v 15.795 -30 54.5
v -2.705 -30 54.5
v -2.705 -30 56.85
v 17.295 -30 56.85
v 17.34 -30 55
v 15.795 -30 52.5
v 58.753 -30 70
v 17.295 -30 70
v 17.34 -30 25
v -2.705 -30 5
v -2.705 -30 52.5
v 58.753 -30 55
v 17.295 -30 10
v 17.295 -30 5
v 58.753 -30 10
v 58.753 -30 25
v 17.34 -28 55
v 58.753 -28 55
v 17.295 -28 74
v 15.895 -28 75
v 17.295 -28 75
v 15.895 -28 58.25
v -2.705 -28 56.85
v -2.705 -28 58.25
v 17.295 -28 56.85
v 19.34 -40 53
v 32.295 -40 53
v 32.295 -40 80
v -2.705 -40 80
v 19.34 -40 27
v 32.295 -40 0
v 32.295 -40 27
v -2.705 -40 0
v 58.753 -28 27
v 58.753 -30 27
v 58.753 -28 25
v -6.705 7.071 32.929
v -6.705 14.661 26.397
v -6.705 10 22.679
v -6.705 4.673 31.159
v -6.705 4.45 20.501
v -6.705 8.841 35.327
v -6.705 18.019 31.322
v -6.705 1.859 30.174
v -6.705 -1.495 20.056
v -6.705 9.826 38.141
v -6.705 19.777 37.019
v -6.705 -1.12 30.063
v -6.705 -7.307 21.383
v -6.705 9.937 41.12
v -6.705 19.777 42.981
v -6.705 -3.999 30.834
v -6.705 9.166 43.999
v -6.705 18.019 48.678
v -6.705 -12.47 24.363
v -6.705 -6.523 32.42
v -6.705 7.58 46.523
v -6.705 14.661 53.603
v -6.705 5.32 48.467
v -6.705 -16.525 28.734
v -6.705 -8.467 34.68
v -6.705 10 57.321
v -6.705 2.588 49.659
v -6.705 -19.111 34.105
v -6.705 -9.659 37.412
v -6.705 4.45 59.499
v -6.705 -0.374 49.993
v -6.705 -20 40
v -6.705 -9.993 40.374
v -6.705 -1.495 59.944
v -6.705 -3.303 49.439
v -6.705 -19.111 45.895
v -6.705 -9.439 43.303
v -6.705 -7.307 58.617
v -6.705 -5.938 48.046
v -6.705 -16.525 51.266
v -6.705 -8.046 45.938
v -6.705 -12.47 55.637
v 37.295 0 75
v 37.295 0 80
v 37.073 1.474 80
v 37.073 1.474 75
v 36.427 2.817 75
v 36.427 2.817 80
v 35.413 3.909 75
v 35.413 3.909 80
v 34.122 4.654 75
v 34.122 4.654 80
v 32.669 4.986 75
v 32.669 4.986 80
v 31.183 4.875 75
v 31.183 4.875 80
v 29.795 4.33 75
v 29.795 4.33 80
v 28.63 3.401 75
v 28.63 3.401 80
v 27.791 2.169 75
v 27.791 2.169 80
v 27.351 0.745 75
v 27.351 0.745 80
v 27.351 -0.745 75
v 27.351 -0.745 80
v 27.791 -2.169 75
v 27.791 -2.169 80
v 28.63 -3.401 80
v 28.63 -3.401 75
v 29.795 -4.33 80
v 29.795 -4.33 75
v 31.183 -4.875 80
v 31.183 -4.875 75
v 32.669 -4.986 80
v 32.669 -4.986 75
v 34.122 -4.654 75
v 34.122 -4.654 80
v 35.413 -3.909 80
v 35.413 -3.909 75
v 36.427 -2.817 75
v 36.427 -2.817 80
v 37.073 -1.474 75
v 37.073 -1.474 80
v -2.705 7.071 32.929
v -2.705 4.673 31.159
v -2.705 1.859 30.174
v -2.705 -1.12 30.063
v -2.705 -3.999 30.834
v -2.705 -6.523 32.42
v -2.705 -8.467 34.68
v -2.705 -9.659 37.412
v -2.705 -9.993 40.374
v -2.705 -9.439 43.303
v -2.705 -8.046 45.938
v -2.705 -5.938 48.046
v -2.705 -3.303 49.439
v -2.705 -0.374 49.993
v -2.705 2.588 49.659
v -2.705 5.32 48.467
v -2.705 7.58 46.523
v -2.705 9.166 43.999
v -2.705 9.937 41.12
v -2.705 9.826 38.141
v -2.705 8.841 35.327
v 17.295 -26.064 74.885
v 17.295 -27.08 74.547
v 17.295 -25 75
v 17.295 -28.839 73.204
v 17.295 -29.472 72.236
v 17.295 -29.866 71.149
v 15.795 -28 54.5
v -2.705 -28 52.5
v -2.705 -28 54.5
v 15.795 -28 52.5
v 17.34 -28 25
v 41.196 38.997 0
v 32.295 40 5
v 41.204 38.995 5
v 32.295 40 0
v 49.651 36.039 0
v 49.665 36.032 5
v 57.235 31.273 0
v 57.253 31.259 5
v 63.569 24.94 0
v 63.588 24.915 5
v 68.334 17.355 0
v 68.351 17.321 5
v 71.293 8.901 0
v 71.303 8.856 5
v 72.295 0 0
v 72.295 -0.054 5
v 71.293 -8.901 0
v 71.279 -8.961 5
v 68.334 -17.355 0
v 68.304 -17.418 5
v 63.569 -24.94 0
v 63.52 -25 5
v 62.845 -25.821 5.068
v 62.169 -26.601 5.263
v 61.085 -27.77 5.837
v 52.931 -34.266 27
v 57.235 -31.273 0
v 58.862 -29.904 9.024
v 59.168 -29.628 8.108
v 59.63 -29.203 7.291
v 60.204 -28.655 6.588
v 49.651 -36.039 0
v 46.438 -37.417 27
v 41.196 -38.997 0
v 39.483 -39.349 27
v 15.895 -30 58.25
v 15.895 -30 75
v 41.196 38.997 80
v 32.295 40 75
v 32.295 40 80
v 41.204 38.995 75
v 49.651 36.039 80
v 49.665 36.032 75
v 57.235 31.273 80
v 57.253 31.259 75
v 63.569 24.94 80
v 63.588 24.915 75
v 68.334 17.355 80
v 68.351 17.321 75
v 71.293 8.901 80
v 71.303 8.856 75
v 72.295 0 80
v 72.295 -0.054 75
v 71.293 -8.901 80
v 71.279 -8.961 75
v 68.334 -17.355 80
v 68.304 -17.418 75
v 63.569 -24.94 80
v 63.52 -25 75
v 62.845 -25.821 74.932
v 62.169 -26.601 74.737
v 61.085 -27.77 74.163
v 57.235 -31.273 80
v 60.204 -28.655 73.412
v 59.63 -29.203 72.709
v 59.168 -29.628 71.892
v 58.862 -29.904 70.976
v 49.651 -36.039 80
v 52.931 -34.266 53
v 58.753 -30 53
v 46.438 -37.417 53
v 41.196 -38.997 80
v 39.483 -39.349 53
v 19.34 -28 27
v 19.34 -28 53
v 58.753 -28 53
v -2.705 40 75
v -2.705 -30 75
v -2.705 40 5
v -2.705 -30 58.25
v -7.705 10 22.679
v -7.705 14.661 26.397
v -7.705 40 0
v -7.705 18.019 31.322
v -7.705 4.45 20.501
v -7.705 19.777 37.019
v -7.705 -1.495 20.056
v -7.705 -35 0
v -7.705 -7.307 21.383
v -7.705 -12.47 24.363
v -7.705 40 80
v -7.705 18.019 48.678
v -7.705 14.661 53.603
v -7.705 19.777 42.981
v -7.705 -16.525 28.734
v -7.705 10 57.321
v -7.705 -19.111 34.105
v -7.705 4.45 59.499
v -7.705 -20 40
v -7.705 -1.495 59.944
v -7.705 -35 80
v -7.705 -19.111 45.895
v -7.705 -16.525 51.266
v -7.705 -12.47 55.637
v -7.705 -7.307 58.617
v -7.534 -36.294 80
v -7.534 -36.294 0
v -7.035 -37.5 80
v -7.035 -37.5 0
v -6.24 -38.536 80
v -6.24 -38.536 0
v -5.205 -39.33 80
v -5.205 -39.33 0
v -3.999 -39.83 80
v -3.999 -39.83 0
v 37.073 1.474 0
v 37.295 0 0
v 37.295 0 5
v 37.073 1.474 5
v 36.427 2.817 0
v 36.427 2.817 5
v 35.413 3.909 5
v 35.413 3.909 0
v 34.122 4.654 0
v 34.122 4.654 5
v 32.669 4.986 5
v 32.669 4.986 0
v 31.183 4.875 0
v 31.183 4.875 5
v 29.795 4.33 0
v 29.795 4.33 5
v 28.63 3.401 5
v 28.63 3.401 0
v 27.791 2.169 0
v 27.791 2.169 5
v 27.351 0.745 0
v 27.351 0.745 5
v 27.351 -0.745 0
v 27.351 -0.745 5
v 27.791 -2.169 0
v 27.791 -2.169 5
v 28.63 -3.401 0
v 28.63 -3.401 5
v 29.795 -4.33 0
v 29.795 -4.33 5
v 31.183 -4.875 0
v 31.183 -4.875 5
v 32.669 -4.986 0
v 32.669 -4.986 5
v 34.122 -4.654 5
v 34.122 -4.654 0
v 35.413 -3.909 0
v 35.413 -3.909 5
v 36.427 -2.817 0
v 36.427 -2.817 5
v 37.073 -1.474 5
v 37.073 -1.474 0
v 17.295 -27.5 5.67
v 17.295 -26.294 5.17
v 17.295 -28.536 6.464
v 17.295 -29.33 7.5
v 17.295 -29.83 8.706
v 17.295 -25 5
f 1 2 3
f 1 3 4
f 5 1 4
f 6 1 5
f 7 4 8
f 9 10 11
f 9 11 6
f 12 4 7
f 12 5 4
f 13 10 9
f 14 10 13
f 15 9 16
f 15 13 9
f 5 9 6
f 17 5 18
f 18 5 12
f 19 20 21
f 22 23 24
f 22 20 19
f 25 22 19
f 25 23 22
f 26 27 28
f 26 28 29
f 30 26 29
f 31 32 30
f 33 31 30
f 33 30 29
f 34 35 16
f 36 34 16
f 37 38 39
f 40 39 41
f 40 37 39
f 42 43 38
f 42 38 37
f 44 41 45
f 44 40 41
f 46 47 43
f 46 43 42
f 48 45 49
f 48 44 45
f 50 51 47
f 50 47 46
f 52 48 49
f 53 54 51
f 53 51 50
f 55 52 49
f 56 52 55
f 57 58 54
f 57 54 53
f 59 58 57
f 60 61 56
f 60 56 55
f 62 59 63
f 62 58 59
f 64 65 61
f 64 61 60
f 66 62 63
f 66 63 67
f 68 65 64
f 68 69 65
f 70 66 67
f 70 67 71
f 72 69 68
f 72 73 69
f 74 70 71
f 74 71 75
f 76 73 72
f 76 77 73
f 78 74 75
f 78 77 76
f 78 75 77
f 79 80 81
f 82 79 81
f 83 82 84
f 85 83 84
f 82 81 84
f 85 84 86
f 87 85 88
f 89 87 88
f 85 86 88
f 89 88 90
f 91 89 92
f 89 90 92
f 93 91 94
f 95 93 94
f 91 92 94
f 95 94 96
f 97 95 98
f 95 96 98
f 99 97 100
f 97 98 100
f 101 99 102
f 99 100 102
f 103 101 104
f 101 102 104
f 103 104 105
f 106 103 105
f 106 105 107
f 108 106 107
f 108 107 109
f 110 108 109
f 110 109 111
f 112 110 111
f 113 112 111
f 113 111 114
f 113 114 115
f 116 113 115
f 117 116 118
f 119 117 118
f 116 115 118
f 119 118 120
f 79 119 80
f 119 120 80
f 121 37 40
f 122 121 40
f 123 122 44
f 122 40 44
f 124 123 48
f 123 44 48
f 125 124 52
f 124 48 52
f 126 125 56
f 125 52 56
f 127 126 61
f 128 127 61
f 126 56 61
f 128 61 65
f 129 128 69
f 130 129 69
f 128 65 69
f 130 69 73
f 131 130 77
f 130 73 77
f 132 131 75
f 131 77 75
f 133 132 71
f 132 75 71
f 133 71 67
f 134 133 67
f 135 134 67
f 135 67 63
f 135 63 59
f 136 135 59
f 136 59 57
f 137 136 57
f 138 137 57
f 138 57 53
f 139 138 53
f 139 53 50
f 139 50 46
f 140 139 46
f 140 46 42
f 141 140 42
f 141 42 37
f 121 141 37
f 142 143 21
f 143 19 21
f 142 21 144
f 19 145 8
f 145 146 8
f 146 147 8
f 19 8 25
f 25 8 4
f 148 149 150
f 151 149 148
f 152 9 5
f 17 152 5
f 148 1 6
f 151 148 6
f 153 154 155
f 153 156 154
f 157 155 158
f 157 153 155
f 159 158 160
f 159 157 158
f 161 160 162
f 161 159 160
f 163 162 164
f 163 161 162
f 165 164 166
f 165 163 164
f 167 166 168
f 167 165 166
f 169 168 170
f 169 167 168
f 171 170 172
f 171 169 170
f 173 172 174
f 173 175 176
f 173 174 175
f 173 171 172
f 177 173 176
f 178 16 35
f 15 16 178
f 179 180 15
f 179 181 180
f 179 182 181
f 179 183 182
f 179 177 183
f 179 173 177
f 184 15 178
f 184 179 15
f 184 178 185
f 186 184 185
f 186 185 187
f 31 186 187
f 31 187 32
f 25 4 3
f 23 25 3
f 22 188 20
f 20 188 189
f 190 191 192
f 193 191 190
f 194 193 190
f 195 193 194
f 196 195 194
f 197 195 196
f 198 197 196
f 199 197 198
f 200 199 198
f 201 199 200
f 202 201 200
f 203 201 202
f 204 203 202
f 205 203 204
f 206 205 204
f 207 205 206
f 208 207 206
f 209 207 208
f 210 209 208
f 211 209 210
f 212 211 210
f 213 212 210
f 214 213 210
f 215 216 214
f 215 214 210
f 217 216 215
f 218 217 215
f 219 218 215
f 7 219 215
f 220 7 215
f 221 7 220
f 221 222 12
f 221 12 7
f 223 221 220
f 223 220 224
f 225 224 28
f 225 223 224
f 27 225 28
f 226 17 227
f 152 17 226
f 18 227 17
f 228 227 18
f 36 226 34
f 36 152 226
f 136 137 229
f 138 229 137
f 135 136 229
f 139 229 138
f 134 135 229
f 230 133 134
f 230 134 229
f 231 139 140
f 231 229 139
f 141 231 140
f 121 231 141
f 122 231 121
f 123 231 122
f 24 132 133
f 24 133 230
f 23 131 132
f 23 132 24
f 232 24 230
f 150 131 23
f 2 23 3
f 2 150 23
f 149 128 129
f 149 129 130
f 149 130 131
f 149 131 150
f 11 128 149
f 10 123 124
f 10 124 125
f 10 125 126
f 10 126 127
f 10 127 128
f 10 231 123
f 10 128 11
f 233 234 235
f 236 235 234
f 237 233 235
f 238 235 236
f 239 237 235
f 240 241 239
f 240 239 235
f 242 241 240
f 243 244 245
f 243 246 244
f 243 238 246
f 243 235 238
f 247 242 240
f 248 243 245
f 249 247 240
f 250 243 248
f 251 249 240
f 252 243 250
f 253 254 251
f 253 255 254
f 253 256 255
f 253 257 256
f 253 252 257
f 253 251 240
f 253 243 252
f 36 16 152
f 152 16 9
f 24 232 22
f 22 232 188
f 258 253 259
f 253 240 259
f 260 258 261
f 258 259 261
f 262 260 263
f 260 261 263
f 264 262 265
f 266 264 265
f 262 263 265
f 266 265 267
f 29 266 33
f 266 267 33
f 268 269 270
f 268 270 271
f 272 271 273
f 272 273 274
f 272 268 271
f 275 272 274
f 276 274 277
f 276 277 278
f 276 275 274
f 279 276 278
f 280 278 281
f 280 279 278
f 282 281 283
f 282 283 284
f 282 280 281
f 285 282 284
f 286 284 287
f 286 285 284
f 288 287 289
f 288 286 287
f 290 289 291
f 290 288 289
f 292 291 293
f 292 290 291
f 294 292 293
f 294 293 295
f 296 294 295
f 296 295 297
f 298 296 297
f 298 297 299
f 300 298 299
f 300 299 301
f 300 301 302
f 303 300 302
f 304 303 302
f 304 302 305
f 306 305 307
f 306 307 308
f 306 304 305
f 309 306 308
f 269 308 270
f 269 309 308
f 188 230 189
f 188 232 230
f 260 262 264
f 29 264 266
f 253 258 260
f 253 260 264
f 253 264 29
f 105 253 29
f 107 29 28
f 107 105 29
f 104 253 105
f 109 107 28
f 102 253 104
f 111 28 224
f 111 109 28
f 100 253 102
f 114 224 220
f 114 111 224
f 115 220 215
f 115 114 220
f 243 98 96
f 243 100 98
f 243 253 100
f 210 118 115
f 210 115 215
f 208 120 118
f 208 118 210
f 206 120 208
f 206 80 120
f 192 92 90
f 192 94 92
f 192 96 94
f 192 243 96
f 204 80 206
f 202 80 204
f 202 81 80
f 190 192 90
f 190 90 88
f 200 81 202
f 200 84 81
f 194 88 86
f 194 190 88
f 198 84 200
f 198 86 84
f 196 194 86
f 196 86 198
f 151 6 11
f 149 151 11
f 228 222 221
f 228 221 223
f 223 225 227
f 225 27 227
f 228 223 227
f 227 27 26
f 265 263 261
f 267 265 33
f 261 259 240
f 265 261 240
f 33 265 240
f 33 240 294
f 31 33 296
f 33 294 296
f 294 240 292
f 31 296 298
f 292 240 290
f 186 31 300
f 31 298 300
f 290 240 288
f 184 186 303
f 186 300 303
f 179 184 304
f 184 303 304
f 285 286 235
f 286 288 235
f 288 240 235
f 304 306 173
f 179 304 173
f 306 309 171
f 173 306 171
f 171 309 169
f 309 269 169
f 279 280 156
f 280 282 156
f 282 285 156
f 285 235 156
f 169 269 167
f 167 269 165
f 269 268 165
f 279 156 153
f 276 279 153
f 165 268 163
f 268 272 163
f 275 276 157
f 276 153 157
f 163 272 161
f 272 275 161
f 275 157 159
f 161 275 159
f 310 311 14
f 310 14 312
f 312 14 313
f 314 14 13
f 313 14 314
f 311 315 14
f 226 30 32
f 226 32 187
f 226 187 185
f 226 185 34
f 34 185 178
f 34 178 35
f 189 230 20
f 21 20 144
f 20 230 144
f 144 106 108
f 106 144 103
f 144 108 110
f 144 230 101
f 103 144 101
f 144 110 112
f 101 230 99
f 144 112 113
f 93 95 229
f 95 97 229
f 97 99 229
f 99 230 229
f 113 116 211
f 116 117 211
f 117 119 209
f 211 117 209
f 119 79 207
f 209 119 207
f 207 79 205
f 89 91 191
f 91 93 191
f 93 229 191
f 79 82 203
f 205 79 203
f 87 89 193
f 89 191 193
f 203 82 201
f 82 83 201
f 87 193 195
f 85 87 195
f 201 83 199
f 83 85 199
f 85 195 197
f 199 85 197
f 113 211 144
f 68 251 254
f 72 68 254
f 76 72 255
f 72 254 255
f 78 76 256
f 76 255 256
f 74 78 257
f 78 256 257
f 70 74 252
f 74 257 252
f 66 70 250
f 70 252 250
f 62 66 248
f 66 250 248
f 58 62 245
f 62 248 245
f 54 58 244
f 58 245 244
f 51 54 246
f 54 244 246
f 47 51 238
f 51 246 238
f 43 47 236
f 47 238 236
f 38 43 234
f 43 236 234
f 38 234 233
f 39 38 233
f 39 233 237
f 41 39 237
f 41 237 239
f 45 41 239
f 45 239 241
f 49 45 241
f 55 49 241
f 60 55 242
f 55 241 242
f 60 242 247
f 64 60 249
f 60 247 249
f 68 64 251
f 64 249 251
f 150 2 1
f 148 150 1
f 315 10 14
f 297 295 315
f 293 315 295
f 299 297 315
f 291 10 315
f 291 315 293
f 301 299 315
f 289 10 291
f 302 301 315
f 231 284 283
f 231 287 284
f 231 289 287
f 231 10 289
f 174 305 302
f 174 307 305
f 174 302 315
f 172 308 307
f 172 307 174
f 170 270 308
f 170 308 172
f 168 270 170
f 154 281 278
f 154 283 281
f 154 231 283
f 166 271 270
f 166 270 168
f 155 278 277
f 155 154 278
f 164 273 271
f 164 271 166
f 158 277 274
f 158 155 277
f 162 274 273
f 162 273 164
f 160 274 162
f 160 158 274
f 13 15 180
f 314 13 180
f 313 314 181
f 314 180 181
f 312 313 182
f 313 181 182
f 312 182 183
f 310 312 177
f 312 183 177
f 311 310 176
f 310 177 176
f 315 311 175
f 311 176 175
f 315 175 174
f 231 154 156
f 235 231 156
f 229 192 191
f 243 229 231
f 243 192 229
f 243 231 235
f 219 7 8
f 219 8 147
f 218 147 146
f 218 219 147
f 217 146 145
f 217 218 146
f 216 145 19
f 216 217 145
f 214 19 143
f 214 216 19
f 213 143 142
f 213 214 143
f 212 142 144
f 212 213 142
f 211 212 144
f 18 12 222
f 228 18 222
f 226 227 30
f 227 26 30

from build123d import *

# Parameters (mm, degrees)
SKETCH1_R           = 4.9999999999999964
BOSS_EXTRUDE1_DEPTH = 5
BOSS_EXTRUDE2_DEPTH = 70
BOSS_EXTRUDE3_DEPTH = 70
CUT_EXTRUDE1_DEPTH  = 5
SKETCH6_R           = 20.000000000000004
CUT_EXTRUDE2_DEPTH  = 1
CUT_EXTRUDE3_DEPTH  = 19.000000000000004
BOSS_EXTRUDE4_DEPTH = 1.9999999999999896
FILLET1_R           = 5
CUT_EXTRUDE4_DEPTH  = 27.00000000000001
BOSS_EXTRUDE5_DEPTH = 2
BOSS_EXTRUDE6_DEPTH = 2


with BuildPart() as part:
    # Sketch1 → Boss-Extrude1 (new body)
    with BuildSketch(Plane.XY):
        with BuildLine():
            Line((-7.704615384615421, -40.00000000000001), (32.295384615384584, -40.00000000000001))
            ThreePointArc((32.295384615384584, -40.00000000000001), (72.29538461538459, 0), (32.29538461538458, 39.99999999999999))
            Line((32.29538461538458, 39.99999999999999), (-7.7046153846154315, 39.99999999999999))
            Line((-7.7046153846154315, 39.99999999999999), (-7.704615384615421, -40.00000000000001))
        make_face()
        with Locations((32.295384615384584, 0)):
            Circle(SKETCH1_R, mode=Mode.SUBTRACT)
    boss_extrude1 = extrude(amount=BOSS_EXTRUDE1_DEPTH)

    # Sketch2 → Boss-Extrude2 (add)
    with BuildSketch(Plane.XY.offset(5)):
        Polygon((-7.7046153846154315, 39.99999999999999), (-2.70461538461543, 39.99999999999999), (-2.7046153846154235, -40.00000000000001), (-7.704615384615421, -40.00000000000001), align=None)
    extrude(amount=BOSS_EXTRUDE2_DEPTH)

    # Mirror1: Boss-Extrude1 across plane
    add(boss_extrude1.mirror(Plane.XY.offset(40)))

    # Sketch4 → Boss-Extrude3 (add)
    with BuildSketch(Plane.XY.offset(5)):
        with BuildLine():
            Line((-2.7046153846154266, -40.00000000000001), (-2.7046153846154266, -30.000000000000007))
            Line((-2.7046153846154266, -30.000000000000007), (43.497251593214216, -30.000000000000007))
            Line((43.497251593214216, -30.000000000000007), (58.7528977260305, -30.000000000000007))
            ThreePointArc((58.7528977260305, -30.000000000000007), (46.43752023911554, -37.41657386773942), (32.295384615384584, -40.00000000000001))
            Line((32.295384615384584, -40.00000000000001), (-2.7046153846154266, -40.00000000000001))
        make_face()
    extrude(amount=BOSS_EXTRUDE3_DEPTH)

    # Sketch5 → Cut-Extrude1 (cut)
    with BuildSketch(Plane.ZY.offset(7.704615384615426)):
        with BuildLine():
            ThreePointArc((50.00000000000001, -1.388e-14), (43.82683432365097, 9.238795325112829), (32.92893218813463, 7.071067811865561))
            Line((32.92893218813452, 7.0710678118654755), (47.071067811865476, -7.071067811865483))
            ThreePointArc((47.0710678118656, -7.0710678118653725), (49.2387953251129, -3.826834323650836), (50.00000000000001, -1.633e-14))
        make_face()
        with BuildLine():
            Line((47.071067811865476, -7.071067811865483), (32.92893218813452, 7.0710678118654755))
            ThreePointArc((32.92893218813463, 7.071067811865561), (32.92893218813454, -7.071067811865502), (47.0710678118656, -7.0710678118653725))
        make_face()
    extrude(amount=-CUT_EXTRUDE1_DEPTH, mode=Mode.SUBTRACT)

    # Sketch6 → Cut-Extrude2 (cut)
    with BuildSketch(Plane.ZY.offset(7.704615384615426)):
        with Locations(Location((40.00000000000001, -1.388e-14, 0), (0, 0, 270))):
            Circle(SKETCH6_R)
    extrude(amount=-CUT_EXTRUDE2_DEPTH, mode=Mode.SUBTRACT)

    # Sketch7 → Cut-Extrude3 (cut)
    with BuildSketch(Plane(origin=(0, -30.000000000000007, 0), x_dir=(1, 0, 0), z_dir=(0, 1, 0))):
        Polygon((58.7528977260305, -53.00000000000001), (58.7528977260305, -40.00000000000001), (58.7528977260305, -27.000000000000004), (19.339689979409883, -27.000000000000007), (19.339689979409883, -53.00000000000001), align=None)
    extrude(amount=-CUT_EXTRUDE3_DEPTH, mode=Mode.SUBTRACT)

    # Sketch8 → Boss-Extrude4 (add)
    with BuildSketch(Plane(origin=(0, -30.000000000000007, 0), x_dir=(1, 0, 0), z_dir=(0, 1, 0))):
        Polygon((58.7528977260305, -53.00000000000001), (19.33968997940988, -53.00000000000001), (19.33968997940988, -27.000000000000007), (58.7528977260305, -27.000000000000004), (58.7528977260305, -25.000000000000007), (56.7528977260305, -25.000000000000007), (17.33968997940988, -25.000000000000007), (17.33968997940988, -55.00000000000001), (58.7528977260305, -55.00000000000001), align=None)
    extrude(amount=BOSS_EXTRUDE4_DEPTH)

    # Fillet1
    fillet1_edges = [part.edges().sort_by_distance(p)[0] for p in [
        (-7.704615384615421, -40.00000000000001, 40),
        (28.024141170707534, -30.000000000000007, 5),
        (28.024141170707537, -30.000000000000007, 75),
    ]]
    fillet(fillet1_edges, radius=FILLET1_R)

    # Sketch9 → Cut-Extrude4 (cut)
    with BuildSketch(Plane(origin=(0, -30.000000000000007, 0), x_dir=(1, 0, 0), z_dir=(0, 1, 0))):
        Polygon((-2.7046153846154266, -69.99999999999999), (-2.70461538461543, -5), (17.295384615384563, -5), (17.295384615384574, -75), (-2.7046153846154266, -75), align=None)
    extrude(amount=CUT_EXTRUDE4_DEPTH, mode=Mode.SUBTRACT)

    # Sketch10 → Boss-Extrude5 (add)
    with BuildSketch(Plane(origin=(0, -30.000000000000007, 0), x_dir=(1, 0, 0), z_dir=(0, 1, 0))):
        Polygon((15.795384615384572, -52.5), (13.795384615384577, -52.5), (-2.704615384615426, -52.5), (-2.7046153846154257, -54.5), (15.79538461538457, -54.5), align=None)
    extrude(amount=BOSS_EXTRUDE5_DEPTH)

    # Sketch11 → Boss-Extrude6 (add)
    with BuildSketch(Plane(origin=(0, -30.000000000000007, 0), x_dir=(1, 0, 0), z_dir=(0, 1, 0))):
        Polygon((-2.704615384615427, -56.849999999999994), (-2.7046153846154266, -58.24999999999999), (15.895384615384575, -58.24999999999999), (15.895384615384579, -75), (17.295384615384574, -75), (17.295384615384574, -69.99999999999999), (17.295384615384574, -56.849999999999994), align=None)
    extrude(amount=BOSS_EXTRUDE6_DEPTH)


solid = part.part
